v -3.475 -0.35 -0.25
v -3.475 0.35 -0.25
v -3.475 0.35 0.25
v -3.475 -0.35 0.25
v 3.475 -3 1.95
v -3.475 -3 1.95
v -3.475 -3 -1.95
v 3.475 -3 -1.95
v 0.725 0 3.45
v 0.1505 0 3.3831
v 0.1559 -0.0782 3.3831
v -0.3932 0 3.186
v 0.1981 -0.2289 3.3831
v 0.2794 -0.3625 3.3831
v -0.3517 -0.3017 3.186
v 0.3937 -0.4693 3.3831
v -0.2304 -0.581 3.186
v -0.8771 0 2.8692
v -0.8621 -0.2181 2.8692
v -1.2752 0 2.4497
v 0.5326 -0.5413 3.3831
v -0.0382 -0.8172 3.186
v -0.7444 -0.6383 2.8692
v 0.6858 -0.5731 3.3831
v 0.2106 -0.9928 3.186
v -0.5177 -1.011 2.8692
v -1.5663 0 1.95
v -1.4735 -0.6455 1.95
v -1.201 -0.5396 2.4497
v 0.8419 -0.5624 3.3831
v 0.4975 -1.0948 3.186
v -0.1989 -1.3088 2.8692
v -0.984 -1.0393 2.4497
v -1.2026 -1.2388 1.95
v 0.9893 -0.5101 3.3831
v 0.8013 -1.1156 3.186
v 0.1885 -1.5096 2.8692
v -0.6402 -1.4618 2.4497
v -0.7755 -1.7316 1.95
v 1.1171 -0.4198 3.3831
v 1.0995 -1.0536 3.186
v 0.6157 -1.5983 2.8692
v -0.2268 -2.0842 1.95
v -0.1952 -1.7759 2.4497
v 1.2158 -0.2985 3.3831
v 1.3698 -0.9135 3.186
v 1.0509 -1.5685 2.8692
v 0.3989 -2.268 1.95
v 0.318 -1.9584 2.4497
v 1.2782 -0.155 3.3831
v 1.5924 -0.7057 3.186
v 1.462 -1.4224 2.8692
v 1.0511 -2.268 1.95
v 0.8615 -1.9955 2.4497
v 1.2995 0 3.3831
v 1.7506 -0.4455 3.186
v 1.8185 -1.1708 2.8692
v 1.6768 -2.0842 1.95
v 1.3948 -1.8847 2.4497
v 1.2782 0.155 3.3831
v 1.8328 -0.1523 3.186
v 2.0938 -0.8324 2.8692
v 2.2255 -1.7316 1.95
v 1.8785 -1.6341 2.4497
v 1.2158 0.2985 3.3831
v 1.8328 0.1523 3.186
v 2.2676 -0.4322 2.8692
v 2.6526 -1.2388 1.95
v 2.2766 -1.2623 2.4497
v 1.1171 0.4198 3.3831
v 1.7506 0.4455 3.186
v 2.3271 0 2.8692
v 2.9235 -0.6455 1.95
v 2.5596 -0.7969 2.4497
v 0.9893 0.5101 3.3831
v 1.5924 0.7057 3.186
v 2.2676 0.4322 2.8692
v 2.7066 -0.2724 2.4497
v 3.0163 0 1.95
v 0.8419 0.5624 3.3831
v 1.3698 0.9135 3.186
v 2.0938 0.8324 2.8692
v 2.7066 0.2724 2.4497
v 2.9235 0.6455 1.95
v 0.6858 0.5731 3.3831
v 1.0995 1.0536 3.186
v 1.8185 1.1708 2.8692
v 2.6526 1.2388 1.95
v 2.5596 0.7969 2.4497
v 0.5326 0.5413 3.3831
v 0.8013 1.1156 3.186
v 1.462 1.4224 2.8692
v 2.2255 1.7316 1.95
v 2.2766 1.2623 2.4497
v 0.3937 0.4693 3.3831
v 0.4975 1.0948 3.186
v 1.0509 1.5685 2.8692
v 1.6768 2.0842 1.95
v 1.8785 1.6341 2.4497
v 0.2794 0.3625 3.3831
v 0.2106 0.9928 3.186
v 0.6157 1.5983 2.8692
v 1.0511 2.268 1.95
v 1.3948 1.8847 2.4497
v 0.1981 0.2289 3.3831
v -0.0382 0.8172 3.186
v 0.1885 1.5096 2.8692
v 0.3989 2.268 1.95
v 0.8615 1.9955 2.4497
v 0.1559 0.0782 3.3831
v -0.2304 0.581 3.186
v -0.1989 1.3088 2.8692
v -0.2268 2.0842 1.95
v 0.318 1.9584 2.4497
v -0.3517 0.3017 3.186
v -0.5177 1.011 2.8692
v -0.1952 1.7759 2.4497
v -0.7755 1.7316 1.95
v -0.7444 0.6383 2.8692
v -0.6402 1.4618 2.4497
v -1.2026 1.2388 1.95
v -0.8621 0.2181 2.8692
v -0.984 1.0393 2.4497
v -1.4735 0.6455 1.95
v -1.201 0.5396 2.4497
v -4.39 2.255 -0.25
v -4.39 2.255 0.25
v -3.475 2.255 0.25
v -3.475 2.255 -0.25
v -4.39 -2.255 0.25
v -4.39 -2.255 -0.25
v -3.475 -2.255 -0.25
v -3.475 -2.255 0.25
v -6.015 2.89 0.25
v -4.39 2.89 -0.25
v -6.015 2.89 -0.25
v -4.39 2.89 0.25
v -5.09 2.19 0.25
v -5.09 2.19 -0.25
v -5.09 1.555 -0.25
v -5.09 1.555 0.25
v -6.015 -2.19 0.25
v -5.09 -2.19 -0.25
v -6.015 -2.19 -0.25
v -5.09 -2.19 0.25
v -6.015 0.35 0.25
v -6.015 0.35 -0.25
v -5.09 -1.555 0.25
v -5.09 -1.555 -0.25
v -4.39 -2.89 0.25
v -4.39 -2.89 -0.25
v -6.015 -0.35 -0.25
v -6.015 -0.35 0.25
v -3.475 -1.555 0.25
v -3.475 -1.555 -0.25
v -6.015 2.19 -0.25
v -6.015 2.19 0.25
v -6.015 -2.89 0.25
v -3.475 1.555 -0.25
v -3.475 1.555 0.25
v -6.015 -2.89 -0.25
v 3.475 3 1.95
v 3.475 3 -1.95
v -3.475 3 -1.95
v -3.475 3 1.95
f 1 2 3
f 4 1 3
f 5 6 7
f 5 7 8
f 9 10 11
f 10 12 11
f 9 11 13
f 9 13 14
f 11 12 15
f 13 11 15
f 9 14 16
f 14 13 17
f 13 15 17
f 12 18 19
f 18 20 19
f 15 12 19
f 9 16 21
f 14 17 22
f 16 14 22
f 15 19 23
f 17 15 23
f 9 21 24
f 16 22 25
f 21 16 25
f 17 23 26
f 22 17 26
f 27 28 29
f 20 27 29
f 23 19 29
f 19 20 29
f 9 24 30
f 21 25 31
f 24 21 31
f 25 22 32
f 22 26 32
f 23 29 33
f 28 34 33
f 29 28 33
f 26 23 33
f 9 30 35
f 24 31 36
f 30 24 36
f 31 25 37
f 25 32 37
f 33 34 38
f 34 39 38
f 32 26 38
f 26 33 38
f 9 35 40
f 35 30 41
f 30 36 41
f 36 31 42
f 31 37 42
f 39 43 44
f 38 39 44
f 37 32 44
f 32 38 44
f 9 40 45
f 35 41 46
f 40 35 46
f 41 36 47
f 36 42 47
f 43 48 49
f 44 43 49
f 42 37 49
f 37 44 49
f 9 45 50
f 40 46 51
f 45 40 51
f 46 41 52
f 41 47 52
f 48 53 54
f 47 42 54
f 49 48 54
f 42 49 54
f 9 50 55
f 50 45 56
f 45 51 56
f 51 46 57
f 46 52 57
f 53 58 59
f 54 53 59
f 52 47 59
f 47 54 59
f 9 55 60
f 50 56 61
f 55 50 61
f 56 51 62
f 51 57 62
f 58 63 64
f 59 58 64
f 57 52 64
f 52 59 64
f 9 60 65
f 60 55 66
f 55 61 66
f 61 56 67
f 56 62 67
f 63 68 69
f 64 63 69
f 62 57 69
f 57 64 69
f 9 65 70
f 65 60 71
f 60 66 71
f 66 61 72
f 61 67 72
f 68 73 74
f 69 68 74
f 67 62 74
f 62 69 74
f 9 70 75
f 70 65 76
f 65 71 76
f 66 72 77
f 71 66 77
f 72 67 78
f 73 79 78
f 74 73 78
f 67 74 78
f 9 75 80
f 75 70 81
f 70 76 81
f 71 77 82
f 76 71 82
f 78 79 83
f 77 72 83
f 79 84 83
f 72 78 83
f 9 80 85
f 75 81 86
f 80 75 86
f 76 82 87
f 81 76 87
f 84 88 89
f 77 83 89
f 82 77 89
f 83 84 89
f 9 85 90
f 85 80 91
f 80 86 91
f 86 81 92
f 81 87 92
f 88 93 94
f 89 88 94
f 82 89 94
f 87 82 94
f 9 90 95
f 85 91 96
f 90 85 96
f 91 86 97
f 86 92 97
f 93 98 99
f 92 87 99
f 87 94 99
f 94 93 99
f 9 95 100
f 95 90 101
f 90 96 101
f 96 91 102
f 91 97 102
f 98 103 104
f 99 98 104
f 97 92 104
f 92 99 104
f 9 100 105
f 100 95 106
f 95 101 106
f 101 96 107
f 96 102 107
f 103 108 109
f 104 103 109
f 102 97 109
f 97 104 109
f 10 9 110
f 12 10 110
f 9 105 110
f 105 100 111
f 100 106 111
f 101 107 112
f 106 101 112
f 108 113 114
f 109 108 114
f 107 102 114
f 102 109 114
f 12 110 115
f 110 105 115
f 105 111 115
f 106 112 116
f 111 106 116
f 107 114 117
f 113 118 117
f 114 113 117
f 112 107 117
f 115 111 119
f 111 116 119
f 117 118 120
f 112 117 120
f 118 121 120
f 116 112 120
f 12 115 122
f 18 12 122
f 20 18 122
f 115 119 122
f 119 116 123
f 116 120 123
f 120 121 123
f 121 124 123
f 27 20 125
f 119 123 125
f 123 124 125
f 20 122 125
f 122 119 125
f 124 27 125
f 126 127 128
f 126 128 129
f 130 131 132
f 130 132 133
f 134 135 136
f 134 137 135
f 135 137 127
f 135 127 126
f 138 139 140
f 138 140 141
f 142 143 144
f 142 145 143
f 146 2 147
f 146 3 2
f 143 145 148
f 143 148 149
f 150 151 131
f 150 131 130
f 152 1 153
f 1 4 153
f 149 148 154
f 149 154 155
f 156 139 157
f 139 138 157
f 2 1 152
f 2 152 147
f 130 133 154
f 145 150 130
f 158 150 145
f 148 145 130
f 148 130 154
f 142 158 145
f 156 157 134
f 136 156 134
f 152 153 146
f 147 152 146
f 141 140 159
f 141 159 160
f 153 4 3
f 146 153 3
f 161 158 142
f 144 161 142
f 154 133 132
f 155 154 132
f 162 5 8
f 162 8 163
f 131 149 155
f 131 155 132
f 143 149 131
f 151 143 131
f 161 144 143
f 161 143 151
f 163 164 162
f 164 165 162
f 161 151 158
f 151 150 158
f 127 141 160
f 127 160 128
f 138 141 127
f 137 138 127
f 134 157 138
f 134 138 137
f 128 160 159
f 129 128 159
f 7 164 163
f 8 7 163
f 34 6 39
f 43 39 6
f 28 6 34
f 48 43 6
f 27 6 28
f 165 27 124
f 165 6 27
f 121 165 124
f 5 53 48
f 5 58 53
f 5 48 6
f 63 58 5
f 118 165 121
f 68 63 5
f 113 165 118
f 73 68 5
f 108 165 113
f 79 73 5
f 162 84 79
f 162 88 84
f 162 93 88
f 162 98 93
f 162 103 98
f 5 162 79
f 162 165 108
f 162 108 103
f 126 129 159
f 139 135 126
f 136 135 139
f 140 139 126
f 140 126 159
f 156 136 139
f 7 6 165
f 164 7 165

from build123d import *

# Parameters (mm, degrees)
SKETCH1_W               = 6.95
SKETCH1_H               = 6
BOSS_EXTRUDE1_DEPTH     = 1.95
SKETCH6_W               = 0.5
SKETCH6_H               = 0.7
SKETCH7_W               = 0.5
SKETCH7_H               = 0.7
BOSS_EXTRUDE3_DEPTH     = 4.7625
SKETCH8_W               = 0.5
SKETCH8_H               = 0.7
SKETCH11_W              = 0.5
SKETCH11_H              = 0.7
BOSS_EXTRUDE4_DEPTH     = 2.54
CUT_EXTRUDE1_DEPTH      = 4.2
CUT_EXTRUDE1_DEPTH_BACK = 4.04


with BuildPart() as part:
    # Sketch1 → Boss-Extrude1 (new body, symmetric)
    with BuildSketch(Plane.XY):
        Rectangle(SKETCH1_W, SKETCH1_H)
    extrude(amount=BOSS_EXTRUDE1_DEPTH, both=True)

    # Sketch4 → Revolve6 (revolve)
    with BuildSketch(Plane(origin=(0, 0, 0), x_dir=(1, 0, 0), z_dir=(0, 1, 0))):
        with BuildLine():
            Line((-1.566287847, -1.95), (0.725, -1.95))
            Line((0.725, -1.95), (0.725, -3.45))
            ThreePointArc((0.725, -3.45), (-0.644306394, -3.041650066), (-1.566287847, -1.95))
        make_face()
    revolve(axis=Axis((0.725, 0, 1.95), (0, 0, 1)))


with BuildPart() as body_2:
    # Sweep2: sweep along a path in Sketch5
    with BuildLine(Plane.XY) as sweep2_path:
        Line((-3.475, 1.905), (-4.74, 1.905))
        Line((-4.74, 1.905), (-4.74, 2.54))
        Line((-4.74, 2.54), (-8.2375, 2.54))
    # Sketch6 → Sweep2 (sweep)
    with BuildSketch(Plane.ZY.offset(3.475)):
        with Locations((0, 1.905)):
            Rectangle(SKETCH6_W, SKETCH6_H)
    sweep(path=sweep2_path.line, transition=Transition.RIGHT)



with BuildPart() as body_3:
    # Sketch7 → Boss-Extrude3 (new body)
    with BuildSketch(Plane.ZY.offset(3.475)):
        Rectangle(SKETCH7_W, SKETCH7_H)
    extrude(amount=BOSS_EXTRUDE3_DEPTH)


with BuildPart() as body_4:
    # Sweep3: sweep along a path in Sketch10
    with BuildLine(Plane.XY) as sweep3_path:
        Line((-3.475, -1.905), (-4.74, -1.905))
        Line((-4.74, -1.905), (-4.74, -2.54))
        Line((-4.74, -2.54), (-8.2375, -2.54))
    # Sketch8 → Sweep3 (sweep)
    with BuildSketch(Plane.ZY.offset(3.475)):
        with Locations((0, -1.905)):
            Rectangle(SKETCH8_W, SKETCH8_H)
    sweep(path=sweep3_path.line, transition=Transition.RIGHT)


with BuildPart() as body_2_1:
    add(body_2.part)

    add(body_3.part)  # Boss-Extrude4 merges body 3

    add(body_4.part)  # Boss-Extrude4 merges body 4
    # Sketch11 → Boss-Extrude4 (add)
    with BuildSketch(Plane(origin=(0, 0, -0.25), x_dir=(-1, 0, 0), z_dir=(0, 0, -1))):
        with Locations((7.9875, 2.54)):
            Rectangle(SKETCH11_W, SKETCH11_H)
        with Locations((7.9875, 0)):
            Rectangle(SKETCH11_W, SKETCH11_H)
        with Locations((7.9875, -2.54)):
            Rectangle(SKETCH11_W, SKETCH11_H)
    extrude(amount=BOSS_EXTRUDE4_DEPTH)

    # Sketch12 → Cut-Extrude1 (cut, two sides)
    with BuildSketch(Plane.XY.offset(0.25)) as cut_extrude1_sk:
        Polygon((-6.015, 36.864414321), (-6.015, 3.667843), (-6.015, -3.251211746), (-6.015, -36.447783067), (-72.408142643, -36.447783067), (-72.408142643, 36.864414321), align=None)
    extrude(amount=CUT_EXTRUDE1_DEPTH, mode=Mode.SUBTRACT)
    extrude(cut_extrude1_sk.sketch, amount=-CUT_EXTRUDE1_DEPTH_BACK, mode=Mode.SUBTRACT)


solid = Compound([part.part, body_2_1.part])
